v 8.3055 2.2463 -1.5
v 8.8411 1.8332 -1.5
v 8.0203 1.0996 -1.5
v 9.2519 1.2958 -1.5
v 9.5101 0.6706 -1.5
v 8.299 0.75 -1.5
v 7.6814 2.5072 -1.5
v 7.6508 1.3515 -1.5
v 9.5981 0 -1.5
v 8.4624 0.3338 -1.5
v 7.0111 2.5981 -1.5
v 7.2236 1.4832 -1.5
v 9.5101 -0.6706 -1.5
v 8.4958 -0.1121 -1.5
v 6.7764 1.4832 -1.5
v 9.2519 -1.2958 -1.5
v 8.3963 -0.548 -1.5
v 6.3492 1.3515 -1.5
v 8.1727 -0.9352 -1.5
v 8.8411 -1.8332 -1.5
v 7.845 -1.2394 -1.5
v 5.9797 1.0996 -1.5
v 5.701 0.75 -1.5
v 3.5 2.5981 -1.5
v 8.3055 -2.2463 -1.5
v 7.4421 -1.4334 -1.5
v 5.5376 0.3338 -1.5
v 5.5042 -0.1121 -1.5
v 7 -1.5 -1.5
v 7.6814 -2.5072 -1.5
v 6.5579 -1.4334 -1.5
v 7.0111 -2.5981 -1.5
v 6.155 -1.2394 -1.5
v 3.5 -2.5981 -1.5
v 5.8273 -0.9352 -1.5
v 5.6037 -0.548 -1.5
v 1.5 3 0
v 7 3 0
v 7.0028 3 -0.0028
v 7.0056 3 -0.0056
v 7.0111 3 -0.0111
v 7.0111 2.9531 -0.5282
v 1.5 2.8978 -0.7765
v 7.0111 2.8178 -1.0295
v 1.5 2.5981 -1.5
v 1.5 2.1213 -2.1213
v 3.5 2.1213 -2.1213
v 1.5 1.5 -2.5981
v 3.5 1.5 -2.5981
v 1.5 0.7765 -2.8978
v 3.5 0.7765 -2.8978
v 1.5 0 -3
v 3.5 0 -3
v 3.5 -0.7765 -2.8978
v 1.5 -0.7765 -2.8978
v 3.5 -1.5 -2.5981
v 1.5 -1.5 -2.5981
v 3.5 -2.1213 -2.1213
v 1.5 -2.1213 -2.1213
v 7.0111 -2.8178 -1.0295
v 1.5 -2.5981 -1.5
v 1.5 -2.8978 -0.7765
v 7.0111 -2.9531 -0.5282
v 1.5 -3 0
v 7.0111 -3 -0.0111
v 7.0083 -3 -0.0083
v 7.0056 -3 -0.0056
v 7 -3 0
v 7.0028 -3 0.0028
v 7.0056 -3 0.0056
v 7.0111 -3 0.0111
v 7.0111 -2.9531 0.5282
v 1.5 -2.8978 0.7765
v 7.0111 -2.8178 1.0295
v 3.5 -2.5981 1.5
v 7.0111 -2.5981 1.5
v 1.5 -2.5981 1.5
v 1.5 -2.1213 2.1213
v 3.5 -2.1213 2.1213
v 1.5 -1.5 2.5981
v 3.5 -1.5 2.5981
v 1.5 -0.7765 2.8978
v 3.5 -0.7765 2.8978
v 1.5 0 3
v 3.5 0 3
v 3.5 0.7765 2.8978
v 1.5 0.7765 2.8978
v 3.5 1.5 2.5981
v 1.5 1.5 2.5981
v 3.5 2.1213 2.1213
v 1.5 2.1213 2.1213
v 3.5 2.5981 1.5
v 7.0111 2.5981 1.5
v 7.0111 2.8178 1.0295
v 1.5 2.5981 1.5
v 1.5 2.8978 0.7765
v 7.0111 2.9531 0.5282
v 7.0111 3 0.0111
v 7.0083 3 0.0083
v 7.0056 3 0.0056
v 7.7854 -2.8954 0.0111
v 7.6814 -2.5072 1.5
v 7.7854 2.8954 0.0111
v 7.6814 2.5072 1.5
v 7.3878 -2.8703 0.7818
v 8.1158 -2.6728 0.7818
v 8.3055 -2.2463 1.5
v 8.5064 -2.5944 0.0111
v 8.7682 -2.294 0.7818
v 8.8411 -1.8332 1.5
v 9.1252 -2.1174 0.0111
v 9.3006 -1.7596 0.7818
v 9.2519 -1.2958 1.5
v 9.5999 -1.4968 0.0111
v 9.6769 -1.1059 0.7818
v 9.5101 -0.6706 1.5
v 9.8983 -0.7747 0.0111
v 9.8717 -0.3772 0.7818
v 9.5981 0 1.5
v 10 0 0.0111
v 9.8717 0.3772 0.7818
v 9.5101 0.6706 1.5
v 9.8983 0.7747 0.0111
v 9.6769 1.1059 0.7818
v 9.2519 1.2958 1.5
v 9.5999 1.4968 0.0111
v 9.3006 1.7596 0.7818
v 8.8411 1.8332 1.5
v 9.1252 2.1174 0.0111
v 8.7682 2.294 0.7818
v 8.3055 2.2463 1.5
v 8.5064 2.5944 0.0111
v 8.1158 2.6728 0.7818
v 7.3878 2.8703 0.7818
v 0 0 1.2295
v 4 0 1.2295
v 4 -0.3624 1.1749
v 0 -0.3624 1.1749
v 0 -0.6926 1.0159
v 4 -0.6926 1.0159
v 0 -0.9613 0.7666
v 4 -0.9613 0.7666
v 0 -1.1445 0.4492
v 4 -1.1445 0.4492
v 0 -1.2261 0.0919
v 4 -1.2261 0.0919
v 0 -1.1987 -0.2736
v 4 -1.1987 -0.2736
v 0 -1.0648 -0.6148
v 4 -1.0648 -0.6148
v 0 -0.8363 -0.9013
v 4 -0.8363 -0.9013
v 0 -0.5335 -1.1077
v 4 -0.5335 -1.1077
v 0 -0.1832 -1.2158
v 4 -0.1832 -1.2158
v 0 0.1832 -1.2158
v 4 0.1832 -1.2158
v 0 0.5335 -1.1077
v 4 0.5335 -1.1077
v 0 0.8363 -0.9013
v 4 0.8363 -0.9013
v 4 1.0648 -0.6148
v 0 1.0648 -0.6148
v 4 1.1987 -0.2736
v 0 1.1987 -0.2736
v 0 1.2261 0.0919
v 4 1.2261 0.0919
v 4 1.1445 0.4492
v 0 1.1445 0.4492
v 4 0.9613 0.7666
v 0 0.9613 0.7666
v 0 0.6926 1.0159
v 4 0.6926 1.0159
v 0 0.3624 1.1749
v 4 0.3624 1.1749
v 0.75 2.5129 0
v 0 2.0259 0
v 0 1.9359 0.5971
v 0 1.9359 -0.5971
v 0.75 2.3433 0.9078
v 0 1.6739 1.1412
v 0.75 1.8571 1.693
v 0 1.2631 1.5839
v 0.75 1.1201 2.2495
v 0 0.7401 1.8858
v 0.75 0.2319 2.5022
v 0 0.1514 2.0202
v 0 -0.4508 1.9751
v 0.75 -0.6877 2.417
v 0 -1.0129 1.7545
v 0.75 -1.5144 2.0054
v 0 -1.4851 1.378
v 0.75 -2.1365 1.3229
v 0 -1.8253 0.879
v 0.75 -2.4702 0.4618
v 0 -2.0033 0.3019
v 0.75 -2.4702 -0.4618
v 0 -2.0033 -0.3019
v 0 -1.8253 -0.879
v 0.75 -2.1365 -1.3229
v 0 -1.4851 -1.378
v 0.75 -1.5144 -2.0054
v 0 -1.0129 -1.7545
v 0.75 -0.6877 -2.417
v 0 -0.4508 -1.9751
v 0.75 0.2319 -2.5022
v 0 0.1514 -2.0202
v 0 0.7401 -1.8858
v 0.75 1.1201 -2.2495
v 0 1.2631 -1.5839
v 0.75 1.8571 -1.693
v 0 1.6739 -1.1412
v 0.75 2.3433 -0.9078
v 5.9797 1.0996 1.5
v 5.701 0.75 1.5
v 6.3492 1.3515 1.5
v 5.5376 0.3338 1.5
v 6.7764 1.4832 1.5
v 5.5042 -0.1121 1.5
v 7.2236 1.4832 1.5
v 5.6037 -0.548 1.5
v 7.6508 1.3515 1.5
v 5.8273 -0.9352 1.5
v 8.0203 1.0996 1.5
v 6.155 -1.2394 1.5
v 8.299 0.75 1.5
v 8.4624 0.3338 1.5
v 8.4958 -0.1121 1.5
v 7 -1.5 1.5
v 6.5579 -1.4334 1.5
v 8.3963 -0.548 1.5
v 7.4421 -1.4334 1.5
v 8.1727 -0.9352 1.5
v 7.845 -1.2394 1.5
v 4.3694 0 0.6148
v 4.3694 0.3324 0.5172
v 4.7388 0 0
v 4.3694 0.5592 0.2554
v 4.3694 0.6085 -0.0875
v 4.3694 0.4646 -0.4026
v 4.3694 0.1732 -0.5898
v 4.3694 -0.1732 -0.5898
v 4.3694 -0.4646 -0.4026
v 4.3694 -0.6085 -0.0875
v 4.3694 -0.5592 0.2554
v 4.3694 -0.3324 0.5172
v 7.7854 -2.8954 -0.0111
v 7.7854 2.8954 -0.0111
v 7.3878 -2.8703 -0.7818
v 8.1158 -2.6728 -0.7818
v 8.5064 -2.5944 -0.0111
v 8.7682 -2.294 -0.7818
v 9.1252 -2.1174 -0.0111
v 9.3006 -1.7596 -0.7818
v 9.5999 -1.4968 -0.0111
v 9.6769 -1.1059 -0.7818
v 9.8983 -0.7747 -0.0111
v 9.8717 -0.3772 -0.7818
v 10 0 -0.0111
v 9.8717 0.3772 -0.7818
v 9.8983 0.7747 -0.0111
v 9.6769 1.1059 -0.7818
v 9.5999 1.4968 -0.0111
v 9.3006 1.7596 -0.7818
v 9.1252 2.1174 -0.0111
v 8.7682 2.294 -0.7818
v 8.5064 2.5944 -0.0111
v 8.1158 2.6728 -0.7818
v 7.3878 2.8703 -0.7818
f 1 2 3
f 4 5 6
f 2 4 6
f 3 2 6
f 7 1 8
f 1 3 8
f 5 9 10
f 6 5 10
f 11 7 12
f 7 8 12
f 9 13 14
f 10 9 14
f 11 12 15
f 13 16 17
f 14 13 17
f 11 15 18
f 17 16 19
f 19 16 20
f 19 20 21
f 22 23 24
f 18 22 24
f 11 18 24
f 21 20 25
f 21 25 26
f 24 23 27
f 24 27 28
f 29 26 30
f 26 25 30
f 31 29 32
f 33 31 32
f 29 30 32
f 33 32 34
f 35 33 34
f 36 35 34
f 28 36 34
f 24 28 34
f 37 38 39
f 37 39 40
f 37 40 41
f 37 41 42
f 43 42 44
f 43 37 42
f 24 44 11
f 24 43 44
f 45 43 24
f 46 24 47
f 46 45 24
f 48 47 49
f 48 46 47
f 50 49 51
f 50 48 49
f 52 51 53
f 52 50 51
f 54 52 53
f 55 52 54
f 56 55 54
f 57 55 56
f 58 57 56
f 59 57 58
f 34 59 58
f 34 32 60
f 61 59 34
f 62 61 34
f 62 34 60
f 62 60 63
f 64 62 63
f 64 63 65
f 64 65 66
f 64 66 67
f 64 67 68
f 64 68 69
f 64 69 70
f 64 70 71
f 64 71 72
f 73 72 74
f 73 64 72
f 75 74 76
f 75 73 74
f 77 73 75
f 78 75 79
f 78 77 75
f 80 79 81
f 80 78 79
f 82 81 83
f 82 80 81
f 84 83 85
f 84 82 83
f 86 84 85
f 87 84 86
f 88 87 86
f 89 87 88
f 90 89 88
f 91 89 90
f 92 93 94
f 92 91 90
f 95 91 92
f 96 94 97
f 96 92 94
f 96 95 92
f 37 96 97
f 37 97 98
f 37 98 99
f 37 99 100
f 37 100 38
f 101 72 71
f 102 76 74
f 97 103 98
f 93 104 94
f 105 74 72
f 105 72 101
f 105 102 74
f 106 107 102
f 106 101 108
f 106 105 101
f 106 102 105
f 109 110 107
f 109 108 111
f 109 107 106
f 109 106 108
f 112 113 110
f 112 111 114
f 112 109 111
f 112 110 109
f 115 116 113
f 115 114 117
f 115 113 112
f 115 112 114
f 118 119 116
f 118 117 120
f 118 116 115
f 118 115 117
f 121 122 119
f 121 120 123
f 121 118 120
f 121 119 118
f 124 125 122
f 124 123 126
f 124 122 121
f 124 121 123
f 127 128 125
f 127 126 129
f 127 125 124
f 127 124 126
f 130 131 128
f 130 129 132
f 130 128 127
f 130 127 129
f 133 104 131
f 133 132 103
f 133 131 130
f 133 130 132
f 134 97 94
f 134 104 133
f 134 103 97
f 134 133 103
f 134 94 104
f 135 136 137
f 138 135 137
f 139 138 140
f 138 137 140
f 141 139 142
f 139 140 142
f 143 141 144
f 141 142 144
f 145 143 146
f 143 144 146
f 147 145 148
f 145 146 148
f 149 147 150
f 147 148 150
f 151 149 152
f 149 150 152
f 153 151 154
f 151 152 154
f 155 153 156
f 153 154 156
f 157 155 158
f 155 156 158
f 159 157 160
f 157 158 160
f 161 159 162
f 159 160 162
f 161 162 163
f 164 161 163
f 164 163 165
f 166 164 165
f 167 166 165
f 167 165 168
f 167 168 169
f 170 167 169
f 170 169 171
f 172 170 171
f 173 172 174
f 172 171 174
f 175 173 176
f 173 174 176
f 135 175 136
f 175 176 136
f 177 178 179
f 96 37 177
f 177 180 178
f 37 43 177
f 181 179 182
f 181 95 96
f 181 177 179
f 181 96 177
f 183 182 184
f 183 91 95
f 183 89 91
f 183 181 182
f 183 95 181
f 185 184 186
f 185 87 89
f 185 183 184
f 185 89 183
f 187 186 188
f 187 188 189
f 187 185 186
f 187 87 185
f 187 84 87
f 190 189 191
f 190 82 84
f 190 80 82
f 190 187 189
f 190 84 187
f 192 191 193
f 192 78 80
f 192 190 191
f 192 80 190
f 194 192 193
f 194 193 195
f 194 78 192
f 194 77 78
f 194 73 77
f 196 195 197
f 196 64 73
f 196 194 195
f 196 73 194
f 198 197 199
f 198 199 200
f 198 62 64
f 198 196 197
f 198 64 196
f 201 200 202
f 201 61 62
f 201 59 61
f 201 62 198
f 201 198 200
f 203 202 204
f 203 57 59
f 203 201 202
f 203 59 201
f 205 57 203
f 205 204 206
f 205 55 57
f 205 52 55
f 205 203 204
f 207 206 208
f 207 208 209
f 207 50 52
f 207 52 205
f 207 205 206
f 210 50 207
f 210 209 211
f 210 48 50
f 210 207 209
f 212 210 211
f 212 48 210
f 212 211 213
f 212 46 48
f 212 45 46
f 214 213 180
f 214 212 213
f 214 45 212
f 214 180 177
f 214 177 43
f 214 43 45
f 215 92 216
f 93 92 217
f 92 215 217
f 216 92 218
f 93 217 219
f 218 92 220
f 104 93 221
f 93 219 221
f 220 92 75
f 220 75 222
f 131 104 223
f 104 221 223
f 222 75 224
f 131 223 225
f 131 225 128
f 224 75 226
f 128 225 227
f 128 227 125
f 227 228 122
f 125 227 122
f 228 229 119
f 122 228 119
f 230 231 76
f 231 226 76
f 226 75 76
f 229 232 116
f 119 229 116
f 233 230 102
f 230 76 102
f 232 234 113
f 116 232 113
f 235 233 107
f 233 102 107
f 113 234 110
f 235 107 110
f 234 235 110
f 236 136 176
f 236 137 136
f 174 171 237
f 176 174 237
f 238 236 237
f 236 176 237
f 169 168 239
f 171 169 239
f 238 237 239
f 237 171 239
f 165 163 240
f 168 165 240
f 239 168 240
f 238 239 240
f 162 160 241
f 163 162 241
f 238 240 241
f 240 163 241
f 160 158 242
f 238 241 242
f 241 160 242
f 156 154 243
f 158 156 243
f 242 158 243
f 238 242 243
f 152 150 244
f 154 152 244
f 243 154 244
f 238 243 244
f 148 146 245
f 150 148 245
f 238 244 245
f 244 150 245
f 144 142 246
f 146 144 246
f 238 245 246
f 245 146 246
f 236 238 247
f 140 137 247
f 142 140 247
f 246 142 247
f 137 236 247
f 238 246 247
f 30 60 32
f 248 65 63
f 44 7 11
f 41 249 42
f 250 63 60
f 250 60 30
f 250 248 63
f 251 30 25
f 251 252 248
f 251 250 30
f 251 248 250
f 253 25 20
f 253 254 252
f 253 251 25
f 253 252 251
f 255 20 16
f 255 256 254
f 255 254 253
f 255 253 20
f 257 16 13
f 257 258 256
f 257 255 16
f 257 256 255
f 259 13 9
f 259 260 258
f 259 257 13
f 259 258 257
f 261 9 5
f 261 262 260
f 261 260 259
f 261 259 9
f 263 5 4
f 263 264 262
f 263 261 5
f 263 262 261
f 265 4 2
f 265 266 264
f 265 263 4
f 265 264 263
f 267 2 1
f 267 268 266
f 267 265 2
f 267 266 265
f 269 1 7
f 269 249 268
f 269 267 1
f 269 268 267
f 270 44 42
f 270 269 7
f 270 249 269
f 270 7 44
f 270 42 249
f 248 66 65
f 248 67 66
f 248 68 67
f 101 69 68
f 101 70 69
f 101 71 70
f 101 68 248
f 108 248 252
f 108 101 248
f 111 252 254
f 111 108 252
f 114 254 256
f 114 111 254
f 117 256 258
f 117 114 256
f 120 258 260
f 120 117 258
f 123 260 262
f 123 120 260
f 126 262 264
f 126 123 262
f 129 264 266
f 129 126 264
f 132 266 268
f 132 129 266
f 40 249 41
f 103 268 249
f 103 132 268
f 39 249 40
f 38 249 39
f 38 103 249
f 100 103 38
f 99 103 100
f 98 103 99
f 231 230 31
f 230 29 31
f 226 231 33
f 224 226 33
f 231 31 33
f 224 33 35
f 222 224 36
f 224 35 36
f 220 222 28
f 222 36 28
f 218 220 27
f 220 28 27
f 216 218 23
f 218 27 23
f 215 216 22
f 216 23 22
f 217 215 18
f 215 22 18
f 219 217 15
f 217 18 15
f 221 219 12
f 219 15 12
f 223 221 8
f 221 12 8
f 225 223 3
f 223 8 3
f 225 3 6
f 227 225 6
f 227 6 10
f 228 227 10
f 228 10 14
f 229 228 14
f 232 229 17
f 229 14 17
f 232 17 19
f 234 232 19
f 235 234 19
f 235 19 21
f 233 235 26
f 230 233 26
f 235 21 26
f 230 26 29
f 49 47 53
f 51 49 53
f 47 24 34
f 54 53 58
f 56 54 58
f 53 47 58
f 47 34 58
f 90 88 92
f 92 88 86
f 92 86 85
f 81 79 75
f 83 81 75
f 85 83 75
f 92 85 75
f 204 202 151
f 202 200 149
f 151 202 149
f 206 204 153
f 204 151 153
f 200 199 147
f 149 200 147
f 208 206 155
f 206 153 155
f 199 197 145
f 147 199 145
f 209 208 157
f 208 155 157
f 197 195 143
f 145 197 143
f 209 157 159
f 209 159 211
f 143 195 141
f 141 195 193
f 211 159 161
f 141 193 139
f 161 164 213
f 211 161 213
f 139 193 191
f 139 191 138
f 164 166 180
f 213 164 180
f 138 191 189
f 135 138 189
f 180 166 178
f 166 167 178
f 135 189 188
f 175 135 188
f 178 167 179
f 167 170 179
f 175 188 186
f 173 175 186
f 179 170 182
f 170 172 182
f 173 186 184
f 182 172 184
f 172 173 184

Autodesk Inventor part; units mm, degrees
ref_plane "YZ Plane" through (0, 0, 0) normal (1, 0, 0) x (0, 1, 0)
ref_plane "XY Plane" through (0, 0, 0) normal (0, 0, 1) x (1, 0, 0)
sketch "Skizze1" plane through (0, 0, 0) normal (0, 0, 1) x (1, 0, 0)
  line L0 (0, -0.6) -> (0, 3.6) projected
  line L1 (-2, 0) -> (12, 0) projected
  line L2 (0, 0) -> (10, 0)
  line L3 (10, 0) -> (10, 3)
  line L4 (10, 3) -> (0, 3)
  line L5 (0, 3) -> (0, 0)
  dimension "d1" = 10
  dimension "d2" = 6
revolve "Umdrehung1" add sketch "Skizze1" angle 360 about axis through (-10, 0, 0) along (1, 0, 0)
ref_plane "Arbeitsebene1" through (5, -3, 0) normal (0, 1, 0) x (-1, 0, 0)
sketch "Skizze2" plane through (5, -3, 0) normal (0, 1, 0) x (-1, 0, 0)
  line L0 (5, 3) -> (5, -3) projected
  line L1 (-5, 3) -> (-5, -3) projected
  line L2 (5, -3) -> (-5, -3) projected
  line L3 (5, 3) -> (-5, 3) projected
  line L4 (1.5, 3) -> (1.5, 1.5)
  line L5 (1.5, 1.5) -> (-5, 1.5)
  line L6 (-5, -1.5) -> (1.5, -1.5)
  line L7 (1.5, -1.5) -> (1.5, -3)
  line L8 (-5, 1.5) -> (-5, 3)
  line L9 (-5, 3) -> (1.5, 3)
  line L10 (-5, 3) -> (-5, -3) projected
  line L11 (-5, -1.5) -> (-5, -3)
  line L12 (-5, -3) -> (1.5, -3)
  dimension "d4" = 1.5
  dimension "d5" = 1.5
  dimension "d6" = 3.5
extrude "Extrusion1" cut sketch "Skizze2" along normal through all contours L4 L5 L1 L3 | L2 L1 L6 L7
chamfer "Fase1" distance 1.5 angle 33 1 edges at (0, -3, 0) measured on face at (4.5, -2.8079, -1.0563)
sketch "Skizze3" plane through (3.5, 2.5981, 1.5) normal (0, 0, 1) x (1, 0, 0)
  line L0 (6.5, 0) -> (6.5, -5.1962) construction
  arc A0 (3.5, -5.5981) -> (3.5, 0.4019) centre (3.5, -2.5981) ccw
  line L1 (6.5, 0) -> (6.5, 0.4019) projected
  line L2 (3.5, 0.4019) -> (7.092, 0.4019)
  line L3 (-2, 0.4019) -> (6.5, 0.4019) projected
  line L4 (7.092, 0.4019) -> (7.092, -5.5981)
  line L5 (7.092, -5.5981) -> (3.5, -5.5981)
  line L6 (-5.6184, -5.5981) -> (9.2105, -5.5981) projected
  point P0 (-3.5, -2.5981)
  point P1 (6.5, -5.5981)
  dimension "d13" = 3
  dimension "d14" = 3.592
extrude "Extrusion2" cut sketch "Skizze3" against normal through all
sketch "Skizze4" plane through (3.5, -2.5981, 1.5) normal (0, 0, 1) x (1, 0, 0)
  arc A0 (5, 0) -> (5, 5.1962) centre (3.5, 2.5981) ccw projected
  point P0 (-3.5, 2.5981)
hole "Bohrung1" at (7, 0, 1.5) at (7, 0, 1.5) direction (0, 0, -1) diameter 3 depth 3 tip angle 118
sketch "Skizze7" plane through (0, 0, 0) normal (-1, 0, 0) x (0, 0, 1)
  arc A0 (1.5, 2.5981) -> (-1.5, 2.5981) centre (0, 0) ccw
  circle A1 centre (0, 0) radius 3 construction
  line L0 (-1.5, 2.5981) -> (-1.5, 4)
  line L1 (-1.5, 4) -> (1.5, 4)
  line L2 (1.5, 4) -> (1.5, 2.5981)
  line L3 (0, -4.5424) -> (0, 5.5632) projected
  dimension "d25" = 1.5
  dimension "d26" = 3
  dimension "d27" = 4
sketch "Skizze8" plane through (3.5, -2.5981, 1.5) normal (0, 0, 1) x (1, 0, 0)
  line L0 (-2, 5.5981) -> (3.5, 5.5981) projected
  line L1 (3.5, 5.5981) -> (-3.5, 5.5981)
  arc A0 (5, 0) -> (5, 5.1962) centre (3.5, 2.5981) ccw projected
  arc A1 (3.5, -0.4019) -> (3.5, 5.5981) centre (3.5, 2.5981) ccw
  line L2 (-2, -0.4019) -> (3.5, -0.4019) projected
  line L3 (3.5, -0.4019) -> (-2.8962, -0.4019)
  point P0 (-3.5, 2.5981)
sweep "Sweeping2" cut profiles "Skizze7" path "Skizze8" path curves L1 A1 L3
sketch "Skizze9" plane through (0, 0, 0) normal (-1, 0, 0) x (0, 0, 1)
  point P0 (0, 0)
  point P1 (0, 0)
hole "Bohrung2" at (0, 0, 0) direction (1, 0, 0) diameter 2.459 depth 4 tip angle 118
properties part number "Stangenkopf"
